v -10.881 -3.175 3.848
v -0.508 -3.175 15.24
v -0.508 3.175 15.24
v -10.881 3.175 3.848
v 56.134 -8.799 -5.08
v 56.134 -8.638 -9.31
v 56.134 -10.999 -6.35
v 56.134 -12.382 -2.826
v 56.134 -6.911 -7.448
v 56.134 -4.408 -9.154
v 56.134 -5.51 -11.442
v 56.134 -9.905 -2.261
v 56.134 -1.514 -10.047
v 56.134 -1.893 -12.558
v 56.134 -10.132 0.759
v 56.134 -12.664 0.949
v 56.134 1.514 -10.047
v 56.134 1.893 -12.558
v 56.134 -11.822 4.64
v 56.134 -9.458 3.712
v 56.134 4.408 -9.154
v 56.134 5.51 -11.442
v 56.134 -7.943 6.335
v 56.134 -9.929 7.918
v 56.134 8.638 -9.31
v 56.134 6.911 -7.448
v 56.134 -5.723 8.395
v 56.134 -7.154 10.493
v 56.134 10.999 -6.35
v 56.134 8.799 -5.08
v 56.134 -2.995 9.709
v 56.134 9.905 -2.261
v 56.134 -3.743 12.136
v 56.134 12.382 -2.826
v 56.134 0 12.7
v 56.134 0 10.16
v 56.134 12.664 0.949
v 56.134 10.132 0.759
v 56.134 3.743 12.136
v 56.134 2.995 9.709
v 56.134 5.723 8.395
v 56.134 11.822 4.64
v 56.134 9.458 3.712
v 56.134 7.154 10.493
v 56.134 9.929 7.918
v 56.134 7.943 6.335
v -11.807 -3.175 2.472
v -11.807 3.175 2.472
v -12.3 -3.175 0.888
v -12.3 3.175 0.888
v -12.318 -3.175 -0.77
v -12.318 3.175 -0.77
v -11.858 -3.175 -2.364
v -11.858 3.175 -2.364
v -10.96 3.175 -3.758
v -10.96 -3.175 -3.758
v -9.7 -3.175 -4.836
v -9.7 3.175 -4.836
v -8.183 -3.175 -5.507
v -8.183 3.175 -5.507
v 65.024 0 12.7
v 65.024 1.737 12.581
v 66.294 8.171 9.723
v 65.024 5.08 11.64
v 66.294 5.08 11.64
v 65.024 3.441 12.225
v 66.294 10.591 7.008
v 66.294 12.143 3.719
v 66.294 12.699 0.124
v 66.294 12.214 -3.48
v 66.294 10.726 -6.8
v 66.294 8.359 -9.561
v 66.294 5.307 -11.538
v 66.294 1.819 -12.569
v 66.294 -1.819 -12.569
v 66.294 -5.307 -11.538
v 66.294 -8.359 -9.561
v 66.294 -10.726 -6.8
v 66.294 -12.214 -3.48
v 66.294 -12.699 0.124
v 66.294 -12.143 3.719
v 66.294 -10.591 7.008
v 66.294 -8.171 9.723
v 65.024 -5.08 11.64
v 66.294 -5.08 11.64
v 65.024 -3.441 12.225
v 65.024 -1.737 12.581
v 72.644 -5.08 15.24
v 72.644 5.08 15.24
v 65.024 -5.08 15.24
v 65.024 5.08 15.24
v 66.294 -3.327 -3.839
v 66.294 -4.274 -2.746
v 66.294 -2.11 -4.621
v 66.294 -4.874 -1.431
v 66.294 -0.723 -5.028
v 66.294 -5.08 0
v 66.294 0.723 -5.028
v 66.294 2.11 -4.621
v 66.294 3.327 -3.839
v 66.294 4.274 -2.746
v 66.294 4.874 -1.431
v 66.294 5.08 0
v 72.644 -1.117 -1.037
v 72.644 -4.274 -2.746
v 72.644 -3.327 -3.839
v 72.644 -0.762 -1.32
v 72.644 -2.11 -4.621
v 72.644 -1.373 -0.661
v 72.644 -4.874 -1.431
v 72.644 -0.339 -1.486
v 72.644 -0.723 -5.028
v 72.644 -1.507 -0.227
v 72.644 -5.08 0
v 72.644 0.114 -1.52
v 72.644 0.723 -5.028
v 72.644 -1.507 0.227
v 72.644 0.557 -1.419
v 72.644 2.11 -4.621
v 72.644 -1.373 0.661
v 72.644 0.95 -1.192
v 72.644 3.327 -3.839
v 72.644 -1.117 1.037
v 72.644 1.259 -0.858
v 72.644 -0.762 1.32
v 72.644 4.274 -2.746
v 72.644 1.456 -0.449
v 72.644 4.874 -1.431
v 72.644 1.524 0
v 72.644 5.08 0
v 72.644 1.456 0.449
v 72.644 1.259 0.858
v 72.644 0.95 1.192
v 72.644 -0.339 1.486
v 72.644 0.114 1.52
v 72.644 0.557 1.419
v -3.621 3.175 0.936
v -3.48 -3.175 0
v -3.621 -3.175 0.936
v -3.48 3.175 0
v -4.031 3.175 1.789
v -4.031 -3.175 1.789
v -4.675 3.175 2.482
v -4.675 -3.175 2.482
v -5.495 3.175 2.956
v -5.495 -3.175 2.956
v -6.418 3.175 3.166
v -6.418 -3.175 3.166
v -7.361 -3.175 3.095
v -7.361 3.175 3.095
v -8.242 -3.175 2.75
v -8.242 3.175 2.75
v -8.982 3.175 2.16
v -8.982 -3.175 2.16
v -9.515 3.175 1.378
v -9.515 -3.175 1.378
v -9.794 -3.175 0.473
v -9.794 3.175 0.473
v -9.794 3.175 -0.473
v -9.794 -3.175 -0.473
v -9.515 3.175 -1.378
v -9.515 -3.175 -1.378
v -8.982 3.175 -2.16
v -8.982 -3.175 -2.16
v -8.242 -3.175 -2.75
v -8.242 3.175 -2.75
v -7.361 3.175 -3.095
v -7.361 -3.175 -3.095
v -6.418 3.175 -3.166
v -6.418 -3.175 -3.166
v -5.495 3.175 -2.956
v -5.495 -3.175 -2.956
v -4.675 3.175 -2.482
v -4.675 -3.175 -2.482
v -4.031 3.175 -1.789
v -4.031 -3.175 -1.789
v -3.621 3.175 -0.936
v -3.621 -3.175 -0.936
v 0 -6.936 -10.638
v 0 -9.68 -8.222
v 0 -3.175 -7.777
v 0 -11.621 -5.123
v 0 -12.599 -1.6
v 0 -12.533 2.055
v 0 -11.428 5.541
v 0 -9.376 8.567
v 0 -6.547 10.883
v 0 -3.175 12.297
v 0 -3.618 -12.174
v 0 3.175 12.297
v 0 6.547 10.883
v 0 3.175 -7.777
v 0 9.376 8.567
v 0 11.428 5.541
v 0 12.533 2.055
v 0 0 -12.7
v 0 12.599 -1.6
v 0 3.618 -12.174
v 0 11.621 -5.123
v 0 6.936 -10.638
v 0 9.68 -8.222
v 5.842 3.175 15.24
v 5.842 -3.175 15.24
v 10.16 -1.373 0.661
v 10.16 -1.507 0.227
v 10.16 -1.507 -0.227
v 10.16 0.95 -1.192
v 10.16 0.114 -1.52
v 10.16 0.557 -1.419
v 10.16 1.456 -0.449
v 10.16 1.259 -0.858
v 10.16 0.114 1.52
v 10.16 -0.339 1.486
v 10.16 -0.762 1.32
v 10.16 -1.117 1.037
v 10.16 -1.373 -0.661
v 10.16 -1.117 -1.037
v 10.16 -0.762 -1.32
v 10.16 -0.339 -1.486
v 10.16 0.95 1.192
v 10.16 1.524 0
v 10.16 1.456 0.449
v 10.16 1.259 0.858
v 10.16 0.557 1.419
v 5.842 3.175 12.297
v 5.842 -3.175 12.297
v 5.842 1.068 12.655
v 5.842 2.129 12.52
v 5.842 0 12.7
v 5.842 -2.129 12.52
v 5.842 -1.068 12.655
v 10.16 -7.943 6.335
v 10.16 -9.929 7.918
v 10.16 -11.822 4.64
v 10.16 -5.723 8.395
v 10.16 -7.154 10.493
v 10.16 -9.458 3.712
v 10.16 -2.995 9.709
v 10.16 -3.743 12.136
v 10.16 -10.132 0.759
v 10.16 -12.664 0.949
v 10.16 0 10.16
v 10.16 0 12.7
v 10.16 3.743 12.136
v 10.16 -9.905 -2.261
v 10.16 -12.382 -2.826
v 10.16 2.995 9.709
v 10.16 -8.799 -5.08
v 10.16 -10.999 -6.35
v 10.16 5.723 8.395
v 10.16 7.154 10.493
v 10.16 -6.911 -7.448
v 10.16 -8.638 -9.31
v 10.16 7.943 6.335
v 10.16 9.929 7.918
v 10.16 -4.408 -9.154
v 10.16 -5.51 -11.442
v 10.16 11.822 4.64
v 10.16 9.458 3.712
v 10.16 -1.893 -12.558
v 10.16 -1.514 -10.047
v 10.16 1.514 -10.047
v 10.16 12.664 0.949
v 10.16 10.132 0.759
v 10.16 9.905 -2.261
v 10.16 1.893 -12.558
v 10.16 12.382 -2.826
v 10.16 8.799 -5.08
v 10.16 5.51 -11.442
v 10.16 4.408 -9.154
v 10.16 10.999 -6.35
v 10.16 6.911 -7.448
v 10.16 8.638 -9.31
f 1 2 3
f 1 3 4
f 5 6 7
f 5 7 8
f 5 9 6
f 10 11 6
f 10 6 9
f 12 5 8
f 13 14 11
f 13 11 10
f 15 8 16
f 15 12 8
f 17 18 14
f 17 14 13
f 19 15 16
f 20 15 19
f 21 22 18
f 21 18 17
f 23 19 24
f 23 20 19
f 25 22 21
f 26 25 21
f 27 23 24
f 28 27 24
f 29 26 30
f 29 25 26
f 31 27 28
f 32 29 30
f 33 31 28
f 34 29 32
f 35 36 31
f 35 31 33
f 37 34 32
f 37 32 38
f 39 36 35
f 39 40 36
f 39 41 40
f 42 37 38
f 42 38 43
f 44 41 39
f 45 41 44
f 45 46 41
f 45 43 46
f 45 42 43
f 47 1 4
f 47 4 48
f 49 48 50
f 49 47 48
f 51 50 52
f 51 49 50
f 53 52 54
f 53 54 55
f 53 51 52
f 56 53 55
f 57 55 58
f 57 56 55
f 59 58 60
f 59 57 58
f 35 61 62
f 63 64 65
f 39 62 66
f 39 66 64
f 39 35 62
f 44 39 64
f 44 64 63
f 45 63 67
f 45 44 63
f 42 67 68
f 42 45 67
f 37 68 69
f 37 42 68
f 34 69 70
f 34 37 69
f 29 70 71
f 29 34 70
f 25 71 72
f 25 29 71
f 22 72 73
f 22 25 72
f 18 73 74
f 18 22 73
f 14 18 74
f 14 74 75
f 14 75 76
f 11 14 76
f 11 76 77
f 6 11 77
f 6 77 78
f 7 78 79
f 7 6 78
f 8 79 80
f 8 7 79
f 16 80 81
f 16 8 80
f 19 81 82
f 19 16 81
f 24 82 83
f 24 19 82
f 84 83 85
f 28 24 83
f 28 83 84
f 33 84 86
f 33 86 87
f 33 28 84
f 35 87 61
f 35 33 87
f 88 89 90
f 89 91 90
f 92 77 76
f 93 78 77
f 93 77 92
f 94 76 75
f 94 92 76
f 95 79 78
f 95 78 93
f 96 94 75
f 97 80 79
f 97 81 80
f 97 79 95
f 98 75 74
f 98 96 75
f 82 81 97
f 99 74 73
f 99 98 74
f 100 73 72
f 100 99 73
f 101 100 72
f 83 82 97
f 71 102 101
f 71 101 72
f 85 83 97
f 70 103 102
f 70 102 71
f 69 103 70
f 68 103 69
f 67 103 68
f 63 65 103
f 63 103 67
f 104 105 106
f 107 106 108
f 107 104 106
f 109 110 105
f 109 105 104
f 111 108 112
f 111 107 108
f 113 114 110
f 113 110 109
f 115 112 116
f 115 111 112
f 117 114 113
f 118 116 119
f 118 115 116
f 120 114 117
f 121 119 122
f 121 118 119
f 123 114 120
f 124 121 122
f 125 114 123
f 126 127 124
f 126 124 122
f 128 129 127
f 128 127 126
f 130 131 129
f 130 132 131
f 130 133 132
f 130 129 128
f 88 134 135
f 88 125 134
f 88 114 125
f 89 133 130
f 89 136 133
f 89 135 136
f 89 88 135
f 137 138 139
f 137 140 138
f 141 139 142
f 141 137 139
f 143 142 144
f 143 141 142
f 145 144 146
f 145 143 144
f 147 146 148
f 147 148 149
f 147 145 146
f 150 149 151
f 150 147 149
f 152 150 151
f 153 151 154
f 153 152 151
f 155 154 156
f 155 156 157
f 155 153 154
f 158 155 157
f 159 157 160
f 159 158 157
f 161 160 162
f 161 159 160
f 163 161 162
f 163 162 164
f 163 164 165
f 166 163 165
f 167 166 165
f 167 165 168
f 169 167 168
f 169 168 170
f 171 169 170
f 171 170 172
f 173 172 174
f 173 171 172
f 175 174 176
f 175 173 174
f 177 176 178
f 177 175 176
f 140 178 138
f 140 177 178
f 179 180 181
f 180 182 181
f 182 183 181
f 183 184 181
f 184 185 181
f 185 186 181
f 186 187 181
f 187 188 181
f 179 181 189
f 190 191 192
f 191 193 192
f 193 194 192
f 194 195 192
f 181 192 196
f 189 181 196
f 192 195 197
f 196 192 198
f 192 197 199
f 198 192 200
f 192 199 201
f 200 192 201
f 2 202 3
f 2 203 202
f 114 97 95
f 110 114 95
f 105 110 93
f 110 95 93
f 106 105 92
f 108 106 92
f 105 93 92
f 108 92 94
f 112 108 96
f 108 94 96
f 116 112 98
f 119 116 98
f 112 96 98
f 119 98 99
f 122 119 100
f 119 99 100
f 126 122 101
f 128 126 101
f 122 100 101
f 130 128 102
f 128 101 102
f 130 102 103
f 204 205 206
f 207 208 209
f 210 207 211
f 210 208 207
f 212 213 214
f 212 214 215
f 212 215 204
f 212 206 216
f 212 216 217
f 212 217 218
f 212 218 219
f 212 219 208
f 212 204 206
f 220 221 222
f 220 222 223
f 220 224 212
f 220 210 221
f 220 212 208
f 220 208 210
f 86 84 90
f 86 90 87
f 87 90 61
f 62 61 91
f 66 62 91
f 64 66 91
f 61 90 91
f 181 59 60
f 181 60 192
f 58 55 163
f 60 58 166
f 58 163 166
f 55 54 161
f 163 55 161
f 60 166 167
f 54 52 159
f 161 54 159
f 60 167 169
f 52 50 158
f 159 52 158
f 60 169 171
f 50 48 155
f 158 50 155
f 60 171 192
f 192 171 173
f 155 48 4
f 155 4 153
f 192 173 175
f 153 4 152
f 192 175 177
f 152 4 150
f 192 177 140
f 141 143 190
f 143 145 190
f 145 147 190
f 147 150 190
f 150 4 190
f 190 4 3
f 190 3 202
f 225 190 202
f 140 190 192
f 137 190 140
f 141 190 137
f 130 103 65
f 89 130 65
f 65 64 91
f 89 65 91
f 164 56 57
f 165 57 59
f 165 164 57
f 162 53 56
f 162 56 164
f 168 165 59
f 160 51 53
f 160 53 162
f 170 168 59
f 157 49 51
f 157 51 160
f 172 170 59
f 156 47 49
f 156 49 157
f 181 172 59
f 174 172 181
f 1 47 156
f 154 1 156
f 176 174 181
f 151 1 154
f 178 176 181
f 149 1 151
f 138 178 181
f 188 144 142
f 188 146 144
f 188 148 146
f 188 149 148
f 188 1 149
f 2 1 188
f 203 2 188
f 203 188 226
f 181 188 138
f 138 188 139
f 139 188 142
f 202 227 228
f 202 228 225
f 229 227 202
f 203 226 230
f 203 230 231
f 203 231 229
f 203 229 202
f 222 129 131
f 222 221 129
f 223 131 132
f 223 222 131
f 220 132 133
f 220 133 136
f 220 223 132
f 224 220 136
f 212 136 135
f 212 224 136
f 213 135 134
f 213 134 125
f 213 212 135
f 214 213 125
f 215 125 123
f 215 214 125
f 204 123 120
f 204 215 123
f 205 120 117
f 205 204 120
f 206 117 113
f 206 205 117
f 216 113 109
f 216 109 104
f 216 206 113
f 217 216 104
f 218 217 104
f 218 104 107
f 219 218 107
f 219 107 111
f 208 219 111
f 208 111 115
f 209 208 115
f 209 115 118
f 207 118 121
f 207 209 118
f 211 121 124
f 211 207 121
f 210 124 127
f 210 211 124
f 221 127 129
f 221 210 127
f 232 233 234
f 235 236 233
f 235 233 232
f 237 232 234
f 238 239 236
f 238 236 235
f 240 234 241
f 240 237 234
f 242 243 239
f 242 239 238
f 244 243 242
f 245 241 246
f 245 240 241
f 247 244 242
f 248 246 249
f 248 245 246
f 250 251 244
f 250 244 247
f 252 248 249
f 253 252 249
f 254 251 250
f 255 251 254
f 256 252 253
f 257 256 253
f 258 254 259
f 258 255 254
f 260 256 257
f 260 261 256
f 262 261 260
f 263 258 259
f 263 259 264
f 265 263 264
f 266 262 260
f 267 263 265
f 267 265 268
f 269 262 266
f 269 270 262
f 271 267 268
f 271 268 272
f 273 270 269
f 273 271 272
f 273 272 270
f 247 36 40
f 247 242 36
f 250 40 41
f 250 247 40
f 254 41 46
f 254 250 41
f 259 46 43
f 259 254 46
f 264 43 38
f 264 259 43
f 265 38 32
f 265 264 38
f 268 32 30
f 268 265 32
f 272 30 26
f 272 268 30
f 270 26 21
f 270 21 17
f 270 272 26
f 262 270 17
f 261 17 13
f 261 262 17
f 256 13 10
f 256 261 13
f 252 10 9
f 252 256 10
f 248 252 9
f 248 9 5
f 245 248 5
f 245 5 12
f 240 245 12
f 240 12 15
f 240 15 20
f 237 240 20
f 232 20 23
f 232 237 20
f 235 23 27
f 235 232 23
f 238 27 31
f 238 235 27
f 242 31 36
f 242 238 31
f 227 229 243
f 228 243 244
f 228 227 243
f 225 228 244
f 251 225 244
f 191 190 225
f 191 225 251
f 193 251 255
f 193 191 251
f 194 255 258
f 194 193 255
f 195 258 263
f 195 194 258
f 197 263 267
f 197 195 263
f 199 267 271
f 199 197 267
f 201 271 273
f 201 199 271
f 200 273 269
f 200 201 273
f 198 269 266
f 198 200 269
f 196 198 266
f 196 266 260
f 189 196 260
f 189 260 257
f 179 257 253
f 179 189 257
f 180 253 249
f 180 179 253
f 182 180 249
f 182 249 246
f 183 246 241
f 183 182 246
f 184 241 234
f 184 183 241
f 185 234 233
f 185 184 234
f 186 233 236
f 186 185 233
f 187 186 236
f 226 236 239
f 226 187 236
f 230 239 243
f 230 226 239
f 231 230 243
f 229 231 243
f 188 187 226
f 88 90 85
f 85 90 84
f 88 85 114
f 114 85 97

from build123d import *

# Parameters (mm, degrees)
F0_W     = 5.842
F0_H     = 12.7
F0_R     = 3.175
F1_DEPTH = 3.175
F4_DEPTH = 1.27
F3_R     = 1.524
F5_DEPTH = 56.134
F6_DEPTH = 6.35


with BuildPart() as f1:
    # F0 (on Front) → F1 (new body, symmetric)
    with BuildSketch(Plane.XZ):
        with BuildLine():
            Line((-0.9398, 0), (0, 0))
            Line((0, 0), (0, 12.7))
            Line((0, 12.7), (5.842, 12.7))
            Line((5.842, 12.7), (5.842, 15.24))
            Line((5.842, 15.24), (-0.508, 15.24))
            Line((-0.508, 15.24), (-10.8806298187, 3.8475430269))
            ThreePointArc((-10.8806298187, 3.8475430269), (-4.5919612295, 5.3297205562), (-0.9398, 0))
        make_face()
        with Locations((2.921, 6.35)):
            Rectangle(F0_W, F0_H)
        with BuildLine():
            ThreePointArc((-8.1826630726, -5.5069827884), (-3.1957909266, -4.5493385486), (-0.9398, 0))
            ThreePointArc((-0.9398, 0), (-4.5919612295, 5.3297205562), (-10.8806298187, 3.8475430269))
            ThreePointArc((-10.8806298187, 3.8475430269), (-12.1459778134, -1.5837270034), (-8.1826630726, -5.5069827884))
        make_face()
        with Locations((-6.6548, 0)):
            Circle(F0_R, mode=Mode.SUBTRACT)
        with BuildLine():
            Line((5.842, 0), (0, 0))
            Line((0, 0), (-0.9398, 0))
            ThreePointArc((-0.9398, 0), (-3.1957909266, -4.5493385486), (-8.1826630726, -5.5069827884))
            Line((-8.1826630726, -5.5069827884), (5.842, -9.398))
            Line((5.842, -9.398), (5.842, 0))
        make_face()
    extrude(amount=F1_DEPTH, both=True)

    # F0 (on Front) → F2 (revolve)
    with BuildSketch(Plane.XZ):
        Polygon((5.842, 12.7), (5.842, 0), (66.294, 0), (66.294, 12.7), (56.134, 12.7), (56.134, 10.16), (10.16, 10.16), (10.16, 12.7), align=None)
        with Locations((2.921, 6.35)):
            Rectangle(F0_W, F0_H)
    revolve(axis=Axis((33.147, 0, 0), (-1, 0, 0)))

    # F3 (on face) → F4 (join)
    with BuildSketch(Plane.YZ.offset(66.294)):
        with BuildLine():
            ThreePointArc((-5.08, 11.6397422652), (0, 12.7), (5.08, 11.6397422652))
            Line((5.08, 11.6397422652), (5.08, 15.24))
            Line((5.08, 15.24), (-5.08, 15.24))
            Line((-5.08, 15.24), (-5.08, 11.6397422652))
        make_face()
    extrude(amount=-F4_DEPTH)

    # F3 (on face) → F5 (cut, through all)
    with BuildSketch(Plane.YZ.offset(66.294)):
        Circle(F3_R)
    extrude(amount=-F5_DEPTH, mode=Mode.SUBTRACT)

    # F3 (on face) → F6 (join)
    with BuildSketch(Plane.YZ.offset(66.294)):
        with BuildLine():
            ThreePointArc((-5.08, 0), (0, -5.08), (5.08, 0))
            ThreePointArc((5.08, 0), (0, 5.08), (-5.08, 0))
        make_face()
        Circle(F3_R, mode=Mode.SUBTRACT)
        with BuildLine():
            ThreePointArc((-5.08, 0), (0, 5.08), (5.08, 0))
            Line((5.08, 0), (5.08, 11.6397422652))
            ThreePointArc((5.08, 11.6397422652), (0, 12.7), (-5.08, 11.6397422652))
            Line((-5.08, 11.6397422652), (-5.08, 0))
        make_face()
        with BuildLine():
            ThreePointArc((-5.08, 11.6397422652), (0, 12.7), (5.08, 11.6397422652))
            Line((5.08, 11.6397422652), (5.08, 15.24))
            Line((5.08, 15.24), (-5.08, 15.24))
            Line((-5.08, 15.24), (-5.08, 11.6397422652))
        make_face()
    extrude(amount=F6_DEPTH)


solid = f1.part
